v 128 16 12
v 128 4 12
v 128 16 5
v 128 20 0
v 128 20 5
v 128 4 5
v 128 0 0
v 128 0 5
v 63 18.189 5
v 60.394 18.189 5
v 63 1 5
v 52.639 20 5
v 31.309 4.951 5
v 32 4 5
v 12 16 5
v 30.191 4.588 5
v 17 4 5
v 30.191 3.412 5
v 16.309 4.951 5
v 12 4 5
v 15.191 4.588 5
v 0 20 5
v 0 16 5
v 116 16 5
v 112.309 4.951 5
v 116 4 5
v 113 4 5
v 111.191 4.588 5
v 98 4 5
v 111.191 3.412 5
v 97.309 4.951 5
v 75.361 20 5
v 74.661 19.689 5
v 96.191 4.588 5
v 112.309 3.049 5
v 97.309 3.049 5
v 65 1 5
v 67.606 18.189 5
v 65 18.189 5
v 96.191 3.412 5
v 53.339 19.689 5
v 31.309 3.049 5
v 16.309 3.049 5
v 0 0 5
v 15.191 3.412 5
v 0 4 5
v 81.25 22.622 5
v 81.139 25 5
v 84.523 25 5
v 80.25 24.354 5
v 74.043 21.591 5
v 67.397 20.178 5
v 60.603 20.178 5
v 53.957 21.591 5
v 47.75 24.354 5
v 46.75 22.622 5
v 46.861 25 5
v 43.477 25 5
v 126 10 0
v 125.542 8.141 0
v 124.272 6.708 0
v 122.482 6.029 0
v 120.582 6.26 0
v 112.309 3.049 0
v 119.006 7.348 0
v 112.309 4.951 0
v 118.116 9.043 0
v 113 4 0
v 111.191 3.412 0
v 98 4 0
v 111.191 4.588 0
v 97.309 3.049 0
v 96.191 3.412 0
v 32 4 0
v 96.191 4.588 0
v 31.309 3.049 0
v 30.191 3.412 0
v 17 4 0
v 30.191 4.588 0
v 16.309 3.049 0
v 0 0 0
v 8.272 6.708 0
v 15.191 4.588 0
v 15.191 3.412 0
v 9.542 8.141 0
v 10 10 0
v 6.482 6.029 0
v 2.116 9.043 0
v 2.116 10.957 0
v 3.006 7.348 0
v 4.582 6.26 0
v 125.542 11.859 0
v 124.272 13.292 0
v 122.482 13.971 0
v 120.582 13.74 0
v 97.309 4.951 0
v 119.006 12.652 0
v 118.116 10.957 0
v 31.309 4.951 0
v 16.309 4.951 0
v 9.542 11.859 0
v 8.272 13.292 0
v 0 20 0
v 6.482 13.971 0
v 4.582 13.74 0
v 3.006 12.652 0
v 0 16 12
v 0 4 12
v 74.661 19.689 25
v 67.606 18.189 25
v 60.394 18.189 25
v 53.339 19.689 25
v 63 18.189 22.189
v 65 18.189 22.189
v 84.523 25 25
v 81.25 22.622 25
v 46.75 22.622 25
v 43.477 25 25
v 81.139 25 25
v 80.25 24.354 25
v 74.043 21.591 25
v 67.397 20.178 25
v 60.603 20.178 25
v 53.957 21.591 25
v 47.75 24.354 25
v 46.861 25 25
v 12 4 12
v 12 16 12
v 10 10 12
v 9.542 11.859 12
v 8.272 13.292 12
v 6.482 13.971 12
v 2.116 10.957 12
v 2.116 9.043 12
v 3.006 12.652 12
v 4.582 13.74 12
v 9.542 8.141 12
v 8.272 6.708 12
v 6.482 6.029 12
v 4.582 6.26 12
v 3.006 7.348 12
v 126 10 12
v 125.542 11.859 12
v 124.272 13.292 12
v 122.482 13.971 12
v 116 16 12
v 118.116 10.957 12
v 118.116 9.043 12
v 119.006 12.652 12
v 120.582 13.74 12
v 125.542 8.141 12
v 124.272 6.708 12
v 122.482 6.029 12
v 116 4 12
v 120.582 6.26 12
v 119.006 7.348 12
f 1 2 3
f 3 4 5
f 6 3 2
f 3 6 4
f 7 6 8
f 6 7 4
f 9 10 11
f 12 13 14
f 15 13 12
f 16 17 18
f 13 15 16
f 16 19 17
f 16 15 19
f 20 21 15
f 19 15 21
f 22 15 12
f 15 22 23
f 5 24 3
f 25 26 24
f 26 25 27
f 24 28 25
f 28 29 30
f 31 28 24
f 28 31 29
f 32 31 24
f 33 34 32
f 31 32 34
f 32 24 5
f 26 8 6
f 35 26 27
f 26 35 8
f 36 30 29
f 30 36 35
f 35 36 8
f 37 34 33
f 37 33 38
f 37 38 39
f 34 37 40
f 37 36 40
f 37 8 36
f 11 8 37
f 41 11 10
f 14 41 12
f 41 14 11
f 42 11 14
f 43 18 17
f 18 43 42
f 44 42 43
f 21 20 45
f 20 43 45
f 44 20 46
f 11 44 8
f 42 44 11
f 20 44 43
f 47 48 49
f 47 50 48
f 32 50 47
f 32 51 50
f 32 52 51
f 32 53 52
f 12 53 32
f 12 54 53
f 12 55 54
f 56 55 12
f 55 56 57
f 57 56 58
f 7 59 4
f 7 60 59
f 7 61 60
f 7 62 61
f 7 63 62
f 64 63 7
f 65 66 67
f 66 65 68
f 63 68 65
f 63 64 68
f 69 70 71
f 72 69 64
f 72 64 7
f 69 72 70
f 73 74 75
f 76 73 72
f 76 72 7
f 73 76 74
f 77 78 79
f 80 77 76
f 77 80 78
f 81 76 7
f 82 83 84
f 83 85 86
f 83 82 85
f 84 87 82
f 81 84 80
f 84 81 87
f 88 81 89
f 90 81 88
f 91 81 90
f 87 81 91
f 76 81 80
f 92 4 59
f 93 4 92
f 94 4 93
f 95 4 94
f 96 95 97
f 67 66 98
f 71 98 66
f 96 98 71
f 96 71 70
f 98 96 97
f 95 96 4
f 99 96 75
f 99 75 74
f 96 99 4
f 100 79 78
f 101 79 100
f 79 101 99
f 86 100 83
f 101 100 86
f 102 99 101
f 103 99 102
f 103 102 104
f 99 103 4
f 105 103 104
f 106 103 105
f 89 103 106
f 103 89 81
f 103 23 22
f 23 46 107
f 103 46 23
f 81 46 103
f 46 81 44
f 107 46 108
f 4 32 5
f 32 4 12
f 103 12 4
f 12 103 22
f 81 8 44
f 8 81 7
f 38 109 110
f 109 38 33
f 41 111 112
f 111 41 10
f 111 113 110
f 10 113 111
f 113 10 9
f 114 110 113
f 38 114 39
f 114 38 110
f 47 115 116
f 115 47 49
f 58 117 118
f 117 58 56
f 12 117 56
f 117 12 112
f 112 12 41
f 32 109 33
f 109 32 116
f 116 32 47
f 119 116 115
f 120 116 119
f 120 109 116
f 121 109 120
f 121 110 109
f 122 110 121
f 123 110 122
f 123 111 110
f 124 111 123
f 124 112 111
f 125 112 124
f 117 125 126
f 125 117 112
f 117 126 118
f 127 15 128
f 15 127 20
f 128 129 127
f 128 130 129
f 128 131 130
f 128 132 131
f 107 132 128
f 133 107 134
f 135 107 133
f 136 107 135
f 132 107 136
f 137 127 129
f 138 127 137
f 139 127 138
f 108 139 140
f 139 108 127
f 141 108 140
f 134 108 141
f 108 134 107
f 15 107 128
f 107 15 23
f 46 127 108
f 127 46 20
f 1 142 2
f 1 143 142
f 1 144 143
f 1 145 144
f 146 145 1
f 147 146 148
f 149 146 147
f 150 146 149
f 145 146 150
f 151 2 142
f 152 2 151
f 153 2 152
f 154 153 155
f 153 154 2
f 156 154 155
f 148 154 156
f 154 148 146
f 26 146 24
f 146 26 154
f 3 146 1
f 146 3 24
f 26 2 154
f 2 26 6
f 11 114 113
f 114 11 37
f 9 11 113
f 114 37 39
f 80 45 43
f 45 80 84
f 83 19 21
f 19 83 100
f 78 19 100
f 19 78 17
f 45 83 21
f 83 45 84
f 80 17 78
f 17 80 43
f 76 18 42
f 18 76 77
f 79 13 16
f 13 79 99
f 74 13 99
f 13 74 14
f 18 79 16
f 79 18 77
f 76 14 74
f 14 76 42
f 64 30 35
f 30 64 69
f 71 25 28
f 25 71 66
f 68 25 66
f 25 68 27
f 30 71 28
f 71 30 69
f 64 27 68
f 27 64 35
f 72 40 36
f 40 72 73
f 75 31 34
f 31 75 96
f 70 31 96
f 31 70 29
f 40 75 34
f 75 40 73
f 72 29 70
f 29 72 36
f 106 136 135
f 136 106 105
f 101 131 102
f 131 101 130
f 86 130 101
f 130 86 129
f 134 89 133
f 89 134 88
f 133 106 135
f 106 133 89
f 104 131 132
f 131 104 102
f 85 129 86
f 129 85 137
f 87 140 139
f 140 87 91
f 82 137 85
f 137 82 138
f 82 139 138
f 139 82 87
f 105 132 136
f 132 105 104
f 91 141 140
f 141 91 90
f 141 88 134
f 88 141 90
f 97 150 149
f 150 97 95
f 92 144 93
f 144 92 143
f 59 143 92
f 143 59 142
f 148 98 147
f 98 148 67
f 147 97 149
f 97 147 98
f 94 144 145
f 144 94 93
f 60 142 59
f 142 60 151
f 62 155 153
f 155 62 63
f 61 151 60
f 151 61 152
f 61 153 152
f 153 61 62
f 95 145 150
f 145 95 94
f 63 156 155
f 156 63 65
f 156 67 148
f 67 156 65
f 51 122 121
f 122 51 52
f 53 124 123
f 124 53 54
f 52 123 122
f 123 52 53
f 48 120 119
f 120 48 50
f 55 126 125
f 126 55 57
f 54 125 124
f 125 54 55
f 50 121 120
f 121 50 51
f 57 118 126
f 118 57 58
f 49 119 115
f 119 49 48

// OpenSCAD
largeur_plaque=128;
longeur_plaque=20;
epaiseur_plaque=5;
hauteur_tube=20;
diam_int_tube=65;
diam_ext_tube=diam_int_tube + 4;
distance_trou_moteur=15;
diam_trou_moteur=2;

difference(){
    union(){
        //plaque
        cube([largeur_plaque, longeur_plaque, epaiseur_plaque], center=false);
        
        //cylindre
        translate([largeur_plaque /2, diam_ext_tube / 2 + longeur_plaque-2, epaiseur_plaque]){
            cylinder(h=longeur_plaque, d=diam_ext_tube, center=false);
        }

        //support roulement 1
        translate([0, longeur_plaque / 2 - (8+4) / 2, epaiseur_plaque]){
            cube([8+4, 8+4, 7], center=false);
        }

        //support roulement 1
        translate([largeur_plaque - (8+4), longeur_plaque / 2 - (8+4) / 2, epaiseur_plaque]){
            cube([8+4, 8+4, 7], center=false);
        }
            
        polyhedron(
            points = [
                [largeur_plaque / 2 - 1, 0, epaiseur_plaque - 1],
                [largeur_plaque / 2 + 1, 0, epaiseur_plaque - 1],
                [largeur_plaque / 2 - 1, longeur_plaque, epaiseur_plaque - 1],
                [largeur_plaque / 2 + 1, longeur_plaque, epaiseur_plaque - 1],
                [largeur_plaque / 2 - 1, longeur_plaque, epaiseur_plaque + hauteur_tube - 1],
                [largeur_plaque / 2 + 1, longeur_plaque, epaiseur_plaque + hauteur_tube - 1]
            ], faces = [
                  [1,0,4,5], [0, 1, 3, 2], [2, 3, 5, 4], [5,3,1], [0,2,4]
            ]
        );
    }
    union(){
        translate([0, 0, -1]){
            //trous moteur 1
            translate([16, 4, 0]){
                cylinder(h=epaiseur_plaque+2, d=diam_trou_moteur, center=false);
            }
            translate([distance_trou_moteur + 16, 4, 0]){
                cylinder(h=epaiseur_plaque+2, d=diam_trou_moteur, center=false);
            }
            
            //trous moteur 2
            translate([largeur_plaque - 16, 4, 0]){
                cylinder(h=epaiseur_plaque+2, d=diam_trou_moteur, center=false);
            }
            translate([largeur_plaque - (distance_trou_moteur + 16), 4, 0]){
                cylinder(h=epaiseur_plaque+2, d=diam_trou_moteur, center=false);
            }

            //trou roulement 1
            translate([2 + 8 / 2, longeur_plaque/2, 0]){
                cylinder(h=epaiseur_plaque+7+2, d=8, center=false);
            }

            //trou roulement 
            translate([largeur_plaque - (2 + 8 / 2), longeur_plaque/2, 0]){
                cylinder(h=epaiseur_plaque+7+2, d=8, center=false);
            }
            
            //trou cylindre
            translate([largeur_plaque /2, diam_ext_tube / 2 + longeur_plaque-2, epaiseur_plaque]){
                cylinder(h=hauteur_tube + 5, d=diam_int_tube, center=false);
            }
        
            // coupure cylindre
            translate([0, longeur_plaque + 5, 0]){
                cube([largeur_plaque, diam_ext_tube, longeur_plaque + 5 + 2], center=false);
            }
        }
    }
}
